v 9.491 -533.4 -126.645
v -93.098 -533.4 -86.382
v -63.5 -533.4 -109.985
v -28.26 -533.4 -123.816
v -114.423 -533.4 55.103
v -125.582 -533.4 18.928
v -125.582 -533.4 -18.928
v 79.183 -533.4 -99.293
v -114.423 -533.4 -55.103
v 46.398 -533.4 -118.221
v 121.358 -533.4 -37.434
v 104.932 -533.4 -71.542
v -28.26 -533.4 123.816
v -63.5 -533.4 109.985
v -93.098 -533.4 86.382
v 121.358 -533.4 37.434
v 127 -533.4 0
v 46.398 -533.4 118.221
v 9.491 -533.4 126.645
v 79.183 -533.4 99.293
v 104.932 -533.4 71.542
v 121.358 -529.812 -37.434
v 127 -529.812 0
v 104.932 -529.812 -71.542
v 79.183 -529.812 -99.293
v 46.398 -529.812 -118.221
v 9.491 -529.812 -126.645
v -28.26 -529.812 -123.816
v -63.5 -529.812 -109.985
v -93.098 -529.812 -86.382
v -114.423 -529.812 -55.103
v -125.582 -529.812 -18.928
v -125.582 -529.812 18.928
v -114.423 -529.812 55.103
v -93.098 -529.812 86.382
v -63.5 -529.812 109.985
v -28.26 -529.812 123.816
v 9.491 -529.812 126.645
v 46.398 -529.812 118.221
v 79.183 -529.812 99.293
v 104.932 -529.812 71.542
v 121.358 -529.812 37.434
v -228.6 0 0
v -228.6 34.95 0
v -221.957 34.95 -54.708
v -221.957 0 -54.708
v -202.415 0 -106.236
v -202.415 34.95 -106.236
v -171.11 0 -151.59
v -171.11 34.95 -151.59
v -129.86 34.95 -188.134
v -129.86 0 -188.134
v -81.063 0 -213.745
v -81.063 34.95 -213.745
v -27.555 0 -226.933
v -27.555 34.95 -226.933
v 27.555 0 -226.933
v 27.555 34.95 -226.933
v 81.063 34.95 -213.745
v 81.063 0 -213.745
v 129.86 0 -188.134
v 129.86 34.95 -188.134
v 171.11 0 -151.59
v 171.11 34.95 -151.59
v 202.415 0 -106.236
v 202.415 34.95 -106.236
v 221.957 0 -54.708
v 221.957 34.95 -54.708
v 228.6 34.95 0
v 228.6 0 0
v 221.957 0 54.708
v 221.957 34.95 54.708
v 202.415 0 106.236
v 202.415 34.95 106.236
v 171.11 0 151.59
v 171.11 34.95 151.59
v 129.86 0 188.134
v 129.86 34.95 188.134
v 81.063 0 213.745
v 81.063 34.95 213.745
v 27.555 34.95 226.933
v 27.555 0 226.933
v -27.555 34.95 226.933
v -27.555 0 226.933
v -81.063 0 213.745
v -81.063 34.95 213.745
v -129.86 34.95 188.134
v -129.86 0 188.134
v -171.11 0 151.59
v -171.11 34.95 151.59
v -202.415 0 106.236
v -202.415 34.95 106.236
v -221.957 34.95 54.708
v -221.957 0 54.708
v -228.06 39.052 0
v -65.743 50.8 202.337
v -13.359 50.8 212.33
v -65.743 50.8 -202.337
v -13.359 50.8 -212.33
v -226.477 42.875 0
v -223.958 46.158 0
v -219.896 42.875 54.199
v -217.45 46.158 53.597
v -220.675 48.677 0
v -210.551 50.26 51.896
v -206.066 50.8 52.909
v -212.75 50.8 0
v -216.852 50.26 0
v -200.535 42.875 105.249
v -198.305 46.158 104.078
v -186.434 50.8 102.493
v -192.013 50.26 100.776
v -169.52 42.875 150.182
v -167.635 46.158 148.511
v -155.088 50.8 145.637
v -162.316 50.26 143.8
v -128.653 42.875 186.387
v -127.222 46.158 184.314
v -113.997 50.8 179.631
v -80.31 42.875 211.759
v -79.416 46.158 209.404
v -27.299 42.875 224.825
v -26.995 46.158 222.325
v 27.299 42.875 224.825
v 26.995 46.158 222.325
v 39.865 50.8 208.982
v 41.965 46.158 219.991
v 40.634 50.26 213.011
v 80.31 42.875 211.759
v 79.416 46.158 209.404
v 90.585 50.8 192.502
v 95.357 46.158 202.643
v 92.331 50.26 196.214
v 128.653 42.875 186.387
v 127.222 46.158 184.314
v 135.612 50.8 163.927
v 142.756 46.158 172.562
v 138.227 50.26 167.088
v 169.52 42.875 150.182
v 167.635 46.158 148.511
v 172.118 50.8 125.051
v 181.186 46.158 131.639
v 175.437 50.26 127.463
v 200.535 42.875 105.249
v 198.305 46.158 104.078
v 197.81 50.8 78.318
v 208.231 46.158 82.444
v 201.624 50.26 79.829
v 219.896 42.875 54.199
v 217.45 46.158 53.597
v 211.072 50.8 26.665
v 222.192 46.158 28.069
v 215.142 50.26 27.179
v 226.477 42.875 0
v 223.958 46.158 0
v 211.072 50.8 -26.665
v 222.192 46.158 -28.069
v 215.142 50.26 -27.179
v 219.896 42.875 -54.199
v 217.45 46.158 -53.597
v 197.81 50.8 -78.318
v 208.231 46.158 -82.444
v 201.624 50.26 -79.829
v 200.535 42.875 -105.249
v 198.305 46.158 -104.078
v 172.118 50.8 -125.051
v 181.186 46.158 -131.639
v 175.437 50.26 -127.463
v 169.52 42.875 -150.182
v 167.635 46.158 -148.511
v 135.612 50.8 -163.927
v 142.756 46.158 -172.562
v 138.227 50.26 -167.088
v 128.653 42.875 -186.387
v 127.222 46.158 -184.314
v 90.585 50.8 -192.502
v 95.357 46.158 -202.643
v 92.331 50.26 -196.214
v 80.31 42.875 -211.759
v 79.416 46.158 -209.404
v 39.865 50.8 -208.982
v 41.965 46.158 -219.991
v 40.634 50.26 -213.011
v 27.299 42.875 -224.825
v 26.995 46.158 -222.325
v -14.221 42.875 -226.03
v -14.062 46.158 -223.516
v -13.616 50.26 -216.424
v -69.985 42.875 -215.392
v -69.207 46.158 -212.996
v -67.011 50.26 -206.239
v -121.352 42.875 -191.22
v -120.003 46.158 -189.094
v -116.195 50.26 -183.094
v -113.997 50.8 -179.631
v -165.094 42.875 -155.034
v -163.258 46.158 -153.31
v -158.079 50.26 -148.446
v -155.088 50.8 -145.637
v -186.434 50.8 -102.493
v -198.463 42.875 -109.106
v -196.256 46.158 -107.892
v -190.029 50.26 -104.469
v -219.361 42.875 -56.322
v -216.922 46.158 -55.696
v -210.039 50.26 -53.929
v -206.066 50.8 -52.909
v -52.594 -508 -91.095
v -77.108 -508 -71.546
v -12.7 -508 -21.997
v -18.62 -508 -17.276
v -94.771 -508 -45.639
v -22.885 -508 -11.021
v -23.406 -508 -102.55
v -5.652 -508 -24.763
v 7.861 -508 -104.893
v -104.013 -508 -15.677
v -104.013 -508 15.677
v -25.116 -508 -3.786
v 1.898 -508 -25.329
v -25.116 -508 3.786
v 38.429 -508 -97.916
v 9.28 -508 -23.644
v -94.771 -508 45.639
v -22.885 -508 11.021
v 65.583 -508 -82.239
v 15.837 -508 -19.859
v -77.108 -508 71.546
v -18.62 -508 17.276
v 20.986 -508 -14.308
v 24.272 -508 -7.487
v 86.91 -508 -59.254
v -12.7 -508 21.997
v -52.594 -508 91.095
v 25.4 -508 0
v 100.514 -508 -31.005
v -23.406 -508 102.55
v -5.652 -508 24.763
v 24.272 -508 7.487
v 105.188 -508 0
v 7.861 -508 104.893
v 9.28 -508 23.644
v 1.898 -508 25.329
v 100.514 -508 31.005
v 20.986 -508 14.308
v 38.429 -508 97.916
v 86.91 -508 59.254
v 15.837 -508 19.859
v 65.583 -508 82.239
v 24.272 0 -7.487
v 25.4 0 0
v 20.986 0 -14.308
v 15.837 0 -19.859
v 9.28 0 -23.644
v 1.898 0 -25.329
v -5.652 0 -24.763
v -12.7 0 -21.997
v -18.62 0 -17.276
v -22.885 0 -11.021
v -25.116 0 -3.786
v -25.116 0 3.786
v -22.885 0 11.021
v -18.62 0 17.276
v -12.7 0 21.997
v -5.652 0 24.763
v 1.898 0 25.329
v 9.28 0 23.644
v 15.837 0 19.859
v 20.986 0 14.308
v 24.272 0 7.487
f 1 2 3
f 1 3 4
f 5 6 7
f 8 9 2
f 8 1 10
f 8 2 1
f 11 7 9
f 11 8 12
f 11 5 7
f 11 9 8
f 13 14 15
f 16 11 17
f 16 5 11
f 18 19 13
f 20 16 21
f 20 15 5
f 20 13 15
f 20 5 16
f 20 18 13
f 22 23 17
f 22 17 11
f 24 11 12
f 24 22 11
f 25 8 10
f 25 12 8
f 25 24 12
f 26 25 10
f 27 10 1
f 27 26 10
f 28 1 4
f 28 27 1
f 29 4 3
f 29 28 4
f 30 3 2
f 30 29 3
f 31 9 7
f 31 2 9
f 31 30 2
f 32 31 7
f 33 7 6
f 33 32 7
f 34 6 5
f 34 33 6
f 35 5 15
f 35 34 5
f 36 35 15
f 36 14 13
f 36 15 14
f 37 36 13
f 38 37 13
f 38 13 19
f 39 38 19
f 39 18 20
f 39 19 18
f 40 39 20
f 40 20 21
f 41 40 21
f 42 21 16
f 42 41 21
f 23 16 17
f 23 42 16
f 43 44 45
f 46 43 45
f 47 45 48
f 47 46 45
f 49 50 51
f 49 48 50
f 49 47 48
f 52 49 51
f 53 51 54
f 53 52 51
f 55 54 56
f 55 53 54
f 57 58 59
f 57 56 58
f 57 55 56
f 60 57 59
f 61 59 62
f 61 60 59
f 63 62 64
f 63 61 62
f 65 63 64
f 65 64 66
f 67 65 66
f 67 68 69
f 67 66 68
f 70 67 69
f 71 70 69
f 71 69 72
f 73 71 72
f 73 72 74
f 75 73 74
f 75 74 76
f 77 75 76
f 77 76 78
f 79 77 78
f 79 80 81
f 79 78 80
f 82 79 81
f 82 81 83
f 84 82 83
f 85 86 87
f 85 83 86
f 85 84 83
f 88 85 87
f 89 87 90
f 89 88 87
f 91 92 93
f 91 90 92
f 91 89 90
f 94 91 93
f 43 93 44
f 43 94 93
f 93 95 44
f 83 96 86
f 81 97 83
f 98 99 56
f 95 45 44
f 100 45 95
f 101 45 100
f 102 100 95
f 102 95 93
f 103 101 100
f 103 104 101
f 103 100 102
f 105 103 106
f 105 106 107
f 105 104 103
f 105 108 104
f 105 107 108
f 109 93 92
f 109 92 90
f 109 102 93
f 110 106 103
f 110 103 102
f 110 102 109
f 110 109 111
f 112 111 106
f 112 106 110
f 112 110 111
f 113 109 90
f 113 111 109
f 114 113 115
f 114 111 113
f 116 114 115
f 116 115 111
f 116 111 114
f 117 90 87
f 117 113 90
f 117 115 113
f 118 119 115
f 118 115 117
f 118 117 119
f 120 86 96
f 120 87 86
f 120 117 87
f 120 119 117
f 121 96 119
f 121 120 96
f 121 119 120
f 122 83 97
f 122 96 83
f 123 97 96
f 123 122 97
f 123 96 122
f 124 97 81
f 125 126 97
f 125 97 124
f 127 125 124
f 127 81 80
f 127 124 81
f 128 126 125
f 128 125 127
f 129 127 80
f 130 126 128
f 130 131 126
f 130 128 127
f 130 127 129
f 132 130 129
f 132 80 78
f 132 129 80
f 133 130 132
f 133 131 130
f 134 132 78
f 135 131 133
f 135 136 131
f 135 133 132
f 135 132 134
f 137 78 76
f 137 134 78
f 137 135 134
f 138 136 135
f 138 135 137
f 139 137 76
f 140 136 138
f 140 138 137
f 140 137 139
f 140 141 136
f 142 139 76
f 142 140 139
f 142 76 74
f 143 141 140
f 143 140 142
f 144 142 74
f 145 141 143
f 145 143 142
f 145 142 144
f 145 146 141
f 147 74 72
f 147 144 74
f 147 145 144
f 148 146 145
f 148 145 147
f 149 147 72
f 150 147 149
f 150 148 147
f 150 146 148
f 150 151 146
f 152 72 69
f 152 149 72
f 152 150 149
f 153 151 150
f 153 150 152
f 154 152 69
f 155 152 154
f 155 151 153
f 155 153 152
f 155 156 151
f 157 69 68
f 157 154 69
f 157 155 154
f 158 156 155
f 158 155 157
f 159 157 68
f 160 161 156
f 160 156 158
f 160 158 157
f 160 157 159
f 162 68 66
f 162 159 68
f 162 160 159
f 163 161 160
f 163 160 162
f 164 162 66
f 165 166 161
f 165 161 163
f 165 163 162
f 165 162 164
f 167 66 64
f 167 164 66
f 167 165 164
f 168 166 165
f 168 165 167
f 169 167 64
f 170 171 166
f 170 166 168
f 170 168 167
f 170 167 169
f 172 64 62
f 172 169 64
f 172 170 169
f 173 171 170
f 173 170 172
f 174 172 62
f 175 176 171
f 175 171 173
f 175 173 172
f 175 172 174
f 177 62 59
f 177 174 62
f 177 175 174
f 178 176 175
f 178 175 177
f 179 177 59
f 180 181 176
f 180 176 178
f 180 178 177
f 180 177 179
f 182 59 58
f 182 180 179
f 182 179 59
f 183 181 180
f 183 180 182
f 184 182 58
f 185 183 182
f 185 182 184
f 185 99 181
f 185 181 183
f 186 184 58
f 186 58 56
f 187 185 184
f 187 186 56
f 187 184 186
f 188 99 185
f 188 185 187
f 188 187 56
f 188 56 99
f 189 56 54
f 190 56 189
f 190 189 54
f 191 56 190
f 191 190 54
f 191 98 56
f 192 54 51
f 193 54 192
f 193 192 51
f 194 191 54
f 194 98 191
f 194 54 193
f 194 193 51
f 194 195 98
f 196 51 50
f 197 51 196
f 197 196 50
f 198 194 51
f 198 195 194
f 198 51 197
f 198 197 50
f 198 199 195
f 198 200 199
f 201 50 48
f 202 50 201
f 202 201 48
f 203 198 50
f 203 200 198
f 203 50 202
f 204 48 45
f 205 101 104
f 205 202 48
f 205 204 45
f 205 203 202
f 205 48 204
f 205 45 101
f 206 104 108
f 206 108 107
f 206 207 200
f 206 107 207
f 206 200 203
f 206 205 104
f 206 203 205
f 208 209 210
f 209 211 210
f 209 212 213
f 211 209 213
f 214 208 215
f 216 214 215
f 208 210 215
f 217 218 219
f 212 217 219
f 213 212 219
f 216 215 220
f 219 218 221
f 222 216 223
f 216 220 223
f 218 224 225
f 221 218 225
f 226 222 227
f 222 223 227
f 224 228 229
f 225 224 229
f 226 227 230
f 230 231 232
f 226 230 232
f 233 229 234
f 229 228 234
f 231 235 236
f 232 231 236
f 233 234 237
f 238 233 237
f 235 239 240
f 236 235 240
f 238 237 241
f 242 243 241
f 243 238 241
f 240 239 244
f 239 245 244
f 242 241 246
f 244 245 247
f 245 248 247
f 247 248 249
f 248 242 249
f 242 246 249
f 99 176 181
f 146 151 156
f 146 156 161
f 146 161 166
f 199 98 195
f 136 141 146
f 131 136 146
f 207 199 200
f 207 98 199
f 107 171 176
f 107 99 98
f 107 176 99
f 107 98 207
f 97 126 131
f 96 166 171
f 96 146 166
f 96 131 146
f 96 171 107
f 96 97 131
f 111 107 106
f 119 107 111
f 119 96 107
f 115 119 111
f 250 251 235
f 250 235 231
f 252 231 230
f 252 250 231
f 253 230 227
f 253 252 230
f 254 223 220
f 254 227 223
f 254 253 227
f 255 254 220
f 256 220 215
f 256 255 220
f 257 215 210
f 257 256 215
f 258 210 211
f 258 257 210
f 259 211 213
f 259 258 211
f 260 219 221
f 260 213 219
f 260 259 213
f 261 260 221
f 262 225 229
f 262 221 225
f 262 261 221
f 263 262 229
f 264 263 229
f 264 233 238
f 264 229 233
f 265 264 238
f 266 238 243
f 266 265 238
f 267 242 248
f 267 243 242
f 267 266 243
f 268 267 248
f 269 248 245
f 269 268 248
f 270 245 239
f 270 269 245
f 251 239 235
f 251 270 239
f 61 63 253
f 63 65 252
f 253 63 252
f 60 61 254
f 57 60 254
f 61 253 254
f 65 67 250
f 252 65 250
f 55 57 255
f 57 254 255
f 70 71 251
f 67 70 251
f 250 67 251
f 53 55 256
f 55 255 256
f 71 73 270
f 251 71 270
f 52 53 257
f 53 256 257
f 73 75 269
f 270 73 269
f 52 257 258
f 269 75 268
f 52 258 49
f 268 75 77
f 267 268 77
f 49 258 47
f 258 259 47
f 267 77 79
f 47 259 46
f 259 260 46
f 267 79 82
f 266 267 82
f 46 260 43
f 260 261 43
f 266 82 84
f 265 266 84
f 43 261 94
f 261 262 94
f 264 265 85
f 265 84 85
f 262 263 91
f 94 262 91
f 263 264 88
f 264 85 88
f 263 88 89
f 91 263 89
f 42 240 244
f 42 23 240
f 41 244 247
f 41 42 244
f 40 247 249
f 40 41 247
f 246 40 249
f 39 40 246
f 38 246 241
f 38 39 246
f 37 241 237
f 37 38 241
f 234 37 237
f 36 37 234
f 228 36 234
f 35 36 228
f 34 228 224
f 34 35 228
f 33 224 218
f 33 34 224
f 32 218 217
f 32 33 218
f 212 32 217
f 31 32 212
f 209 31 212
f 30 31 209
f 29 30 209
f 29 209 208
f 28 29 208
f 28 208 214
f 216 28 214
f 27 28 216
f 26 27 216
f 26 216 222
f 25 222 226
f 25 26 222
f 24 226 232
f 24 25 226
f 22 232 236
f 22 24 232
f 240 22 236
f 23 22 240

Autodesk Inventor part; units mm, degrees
ref_plane "YZ Plane" through (0, 0, 0) normal (1, 0, 0) x (0, 1, 0)
ref_plane "XZ Plane" through (0, 0, 0) normal (0, 1, 0) x (-1, 0, 0)
ref_plane "XY Plane" through (0, 0, 0) normal (0, 0, 1) x (1, 0, 0)
sketch "Sketch1" plane through (0, 0, 0) normal (0, 1, 0) x (-1, 0, 0)
  circle A0 centre (0, 0) radius 228.6
  dimension "d0" = 457.2
extrude "Extrusion1" add sketch "Sketch1" along normal blind 50.8
fillet "Fillet1" radius 15.85 1 edges at (228.6, 50.8, 0)
sketch "Sketch2" plane through (0, 0, 0) normal (0, -1, 0) x (1, 0, 0)
  circle A0 centre (0, 0) radius 25.4
  dimension "d4" = 50.8
extrude "Extrusion2" add sketch "Sketch2" along normal blind 508
sketch "Sketch3" plane through (0, -508, 0) normal (0, -1, 0) x (1, 0, 0)
  circle A0 centre (0, 0) radius 127
  dimension "d7" = 254
extrude "Extrusion3" add sketch "Sketch3" along normal blind 25.4
chamfer "Chamfer1" distance 21.8125 angle 45 1 edges at (-127, -508, 0)
properties part number "Stool" material "Aluminum 6061, Welded"
